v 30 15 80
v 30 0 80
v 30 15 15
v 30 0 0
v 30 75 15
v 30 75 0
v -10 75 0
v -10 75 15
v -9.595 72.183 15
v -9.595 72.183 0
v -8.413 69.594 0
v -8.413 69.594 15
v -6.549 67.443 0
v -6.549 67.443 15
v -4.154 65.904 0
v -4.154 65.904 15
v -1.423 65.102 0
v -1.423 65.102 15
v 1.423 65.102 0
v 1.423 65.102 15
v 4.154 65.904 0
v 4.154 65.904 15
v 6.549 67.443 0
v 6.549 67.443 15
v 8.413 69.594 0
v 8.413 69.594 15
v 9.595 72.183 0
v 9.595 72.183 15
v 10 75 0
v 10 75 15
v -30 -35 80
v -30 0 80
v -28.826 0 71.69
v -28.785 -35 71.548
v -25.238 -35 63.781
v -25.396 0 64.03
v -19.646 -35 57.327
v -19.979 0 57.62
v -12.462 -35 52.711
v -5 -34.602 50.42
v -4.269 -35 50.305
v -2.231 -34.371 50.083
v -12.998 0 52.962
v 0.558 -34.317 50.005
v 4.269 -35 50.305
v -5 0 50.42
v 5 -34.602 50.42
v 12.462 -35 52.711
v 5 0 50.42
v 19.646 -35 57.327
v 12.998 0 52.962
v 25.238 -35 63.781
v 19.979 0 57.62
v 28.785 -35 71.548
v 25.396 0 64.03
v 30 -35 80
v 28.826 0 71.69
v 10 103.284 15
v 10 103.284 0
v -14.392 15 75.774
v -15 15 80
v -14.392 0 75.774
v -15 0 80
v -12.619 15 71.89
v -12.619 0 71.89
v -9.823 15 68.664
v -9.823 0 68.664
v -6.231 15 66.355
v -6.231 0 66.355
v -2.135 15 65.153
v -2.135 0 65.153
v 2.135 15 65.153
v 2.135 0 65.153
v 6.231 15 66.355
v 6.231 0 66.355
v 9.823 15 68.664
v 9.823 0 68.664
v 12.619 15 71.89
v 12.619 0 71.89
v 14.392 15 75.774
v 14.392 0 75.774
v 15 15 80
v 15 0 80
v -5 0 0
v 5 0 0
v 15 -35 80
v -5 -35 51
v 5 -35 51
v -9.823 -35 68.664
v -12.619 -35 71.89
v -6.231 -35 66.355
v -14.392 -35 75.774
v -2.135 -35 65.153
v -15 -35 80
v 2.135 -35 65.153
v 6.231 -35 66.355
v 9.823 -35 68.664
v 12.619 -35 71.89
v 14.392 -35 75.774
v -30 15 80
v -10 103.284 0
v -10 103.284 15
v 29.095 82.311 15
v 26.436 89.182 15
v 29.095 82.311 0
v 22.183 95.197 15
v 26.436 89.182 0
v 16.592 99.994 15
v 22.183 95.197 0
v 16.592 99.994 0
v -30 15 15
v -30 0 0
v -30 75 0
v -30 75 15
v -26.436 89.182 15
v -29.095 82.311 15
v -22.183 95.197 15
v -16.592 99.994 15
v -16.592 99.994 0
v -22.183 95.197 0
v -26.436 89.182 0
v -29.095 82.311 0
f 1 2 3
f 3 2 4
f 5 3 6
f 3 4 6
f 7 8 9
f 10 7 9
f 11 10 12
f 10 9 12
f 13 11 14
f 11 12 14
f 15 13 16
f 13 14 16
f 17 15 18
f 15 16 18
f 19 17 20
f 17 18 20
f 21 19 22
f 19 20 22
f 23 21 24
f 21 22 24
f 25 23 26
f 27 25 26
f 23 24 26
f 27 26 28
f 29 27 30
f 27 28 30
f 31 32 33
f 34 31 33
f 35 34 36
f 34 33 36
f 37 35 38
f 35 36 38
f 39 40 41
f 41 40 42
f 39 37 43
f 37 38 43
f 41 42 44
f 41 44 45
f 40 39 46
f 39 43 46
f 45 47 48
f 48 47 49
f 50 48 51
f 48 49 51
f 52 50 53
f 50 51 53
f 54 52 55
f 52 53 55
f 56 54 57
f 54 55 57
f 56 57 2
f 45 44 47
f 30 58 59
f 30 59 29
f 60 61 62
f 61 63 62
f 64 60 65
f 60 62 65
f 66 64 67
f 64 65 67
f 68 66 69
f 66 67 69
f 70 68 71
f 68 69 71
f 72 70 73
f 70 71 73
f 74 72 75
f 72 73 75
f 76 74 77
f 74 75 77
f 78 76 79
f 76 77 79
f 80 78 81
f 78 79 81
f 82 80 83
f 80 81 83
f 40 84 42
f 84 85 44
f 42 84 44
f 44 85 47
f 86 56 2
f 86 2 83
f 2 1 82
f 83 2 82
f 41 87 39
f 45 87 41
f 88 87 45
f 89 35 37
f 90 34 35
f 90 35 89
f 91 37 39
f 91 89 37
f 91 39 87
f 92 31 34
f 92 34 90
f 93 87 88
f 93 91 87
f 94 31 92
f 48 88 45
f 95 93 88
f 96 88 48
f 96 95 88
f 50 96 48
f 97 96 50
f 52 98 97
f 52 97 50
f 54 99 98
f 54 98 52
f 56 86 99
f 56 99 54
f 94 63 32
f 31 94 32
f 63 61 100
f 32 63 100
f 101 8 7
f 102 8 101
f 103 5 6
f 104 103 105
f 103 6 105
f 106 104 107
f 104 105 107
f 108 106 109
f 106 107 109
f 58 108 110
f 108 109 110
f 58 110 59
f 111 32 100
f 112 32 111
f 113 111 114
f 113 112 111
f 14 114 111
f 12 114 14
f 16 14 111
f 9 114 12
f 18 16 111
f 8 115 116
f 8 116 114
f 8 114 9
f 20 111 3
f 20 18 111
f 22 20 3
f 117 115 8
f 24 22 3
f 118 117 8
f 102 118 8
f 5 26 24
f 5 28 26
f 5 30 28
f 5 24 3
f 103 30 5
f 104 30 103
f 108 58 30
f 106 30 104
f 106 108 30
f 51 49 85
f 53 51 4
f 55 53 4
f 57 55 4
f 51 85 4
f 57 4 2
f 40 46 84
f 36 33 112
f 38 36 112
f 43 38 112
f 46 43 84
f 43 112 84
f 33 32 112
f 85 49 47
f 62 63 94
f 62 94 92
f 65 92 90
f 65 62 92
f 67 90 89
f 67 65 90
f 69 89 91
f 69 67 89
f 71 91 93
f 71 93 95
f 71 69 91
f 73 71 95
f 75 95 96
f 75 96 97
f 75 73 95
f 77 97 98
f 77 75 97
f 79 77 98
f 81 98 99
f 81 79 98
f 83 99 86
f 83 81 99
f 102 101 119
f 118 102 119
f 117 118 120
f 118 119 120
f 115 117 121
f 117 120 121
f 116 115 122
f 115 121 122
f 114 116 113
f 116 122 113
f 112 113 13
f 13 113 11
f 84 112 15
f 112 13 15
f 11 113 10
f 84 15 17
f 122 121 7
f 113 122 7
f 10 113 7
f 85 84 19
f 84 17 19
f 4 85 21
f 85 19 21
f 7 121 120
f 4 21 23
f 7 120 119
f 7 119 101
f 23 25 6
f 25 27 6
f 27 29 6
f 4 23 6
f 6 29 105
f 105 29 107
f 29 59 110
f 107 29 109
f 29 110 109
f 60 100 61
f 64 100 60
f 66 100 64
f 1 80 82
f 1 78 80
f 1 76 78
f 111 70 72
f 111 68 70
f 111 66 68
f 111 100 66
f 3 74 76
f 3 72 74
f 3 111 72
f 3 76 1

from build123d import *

# Parameters (mm, degrees)
PAD003_DEPTH    = 5
PAD_DEPTH       = 15
SKETCH001_W     = 60
SKETCH001_H     = 15
PAD001_DEPTH    = 65
POCKET_DEPTH    = 15.001
PAD002_DEPTH    = 35
SKETCH004_R     = 15
POCKET001_DEPTH = 103.285271


with BuildPart() as pad003:
    # Sketch005 → Pad003 (new body, symmetric)
    with BuildSketch(Plane.YZ):
        Polygon((0, 0), (-35, 51), (0, 51), align=None)
    extrude(amount=PAD003_DEPTH, both=True)


with BuildPart() as fusion:
    # Sketch → Pad (new body)
    with BuildSketch(Plane.XY):
        with BuildLine():
            ThreePointArc((30, 75), (0, 105), (-30, 75))
            Line((-30, 0), (-30, 75))
            Line((-30, 0), (30, 0))
            Line((30, 0), (30, 75))
        make_face()
    extrude(amount=PAD_DEPTH)

    # Sketch001 → Pad001 (new body)
    with BuildSketch(Plane.XY.offset(15)):
        with Locations((0, 7.5)):
            Rectangle(SKETCH001_W, SKETCH001_H)
    extrude(amount=PAD001_DEPTH)

    # Sketch002 → Pocket (cut, through all)
    with BuildSketch(Plane.XY.offset(15)):
        with BuildLine():
            ThreePointArc((-10, 75.000024), (0, 65), (10, 75.000024))
            Line((10, 109.698372), (10, 75.000024))
            Line((-10, 109.698372), (10, 109.698372))
            Line((-10, 75.000024), (-10, 109.698372))
        make_face()
    extrude(amount=-POCKET_DEPTH, mode=Mode.SUBTRACT)

    # Sketch003 → Pad002 (new body)
    with BuildSketch(Plane.XZ):
        with BuildLine():
            ThreePointArc((-30, 80), (0, 49.999953), (30, 80))
            Line((15, 80), (30, 80))
            ThreePointArc((-15, 80), (0, 64.999953), (15, 80))
            Line((-15, 80), (-30, 80))
        make_face()
    extrude(amount=PAD002_DEPTH)

    # Sketch004 → Pocket001 (cut, through all)
    with BuildSketch(Plane.XZ):
        with Locations((0, 79.999953)):
            Circle(SKETCH004_R)
    extrude(amount=-POCKET001_DEPTH, mode=Mode.SUBTRACT)

    # Fusion: union Pad003
    add(pad003.part)


solid = fusion.part
